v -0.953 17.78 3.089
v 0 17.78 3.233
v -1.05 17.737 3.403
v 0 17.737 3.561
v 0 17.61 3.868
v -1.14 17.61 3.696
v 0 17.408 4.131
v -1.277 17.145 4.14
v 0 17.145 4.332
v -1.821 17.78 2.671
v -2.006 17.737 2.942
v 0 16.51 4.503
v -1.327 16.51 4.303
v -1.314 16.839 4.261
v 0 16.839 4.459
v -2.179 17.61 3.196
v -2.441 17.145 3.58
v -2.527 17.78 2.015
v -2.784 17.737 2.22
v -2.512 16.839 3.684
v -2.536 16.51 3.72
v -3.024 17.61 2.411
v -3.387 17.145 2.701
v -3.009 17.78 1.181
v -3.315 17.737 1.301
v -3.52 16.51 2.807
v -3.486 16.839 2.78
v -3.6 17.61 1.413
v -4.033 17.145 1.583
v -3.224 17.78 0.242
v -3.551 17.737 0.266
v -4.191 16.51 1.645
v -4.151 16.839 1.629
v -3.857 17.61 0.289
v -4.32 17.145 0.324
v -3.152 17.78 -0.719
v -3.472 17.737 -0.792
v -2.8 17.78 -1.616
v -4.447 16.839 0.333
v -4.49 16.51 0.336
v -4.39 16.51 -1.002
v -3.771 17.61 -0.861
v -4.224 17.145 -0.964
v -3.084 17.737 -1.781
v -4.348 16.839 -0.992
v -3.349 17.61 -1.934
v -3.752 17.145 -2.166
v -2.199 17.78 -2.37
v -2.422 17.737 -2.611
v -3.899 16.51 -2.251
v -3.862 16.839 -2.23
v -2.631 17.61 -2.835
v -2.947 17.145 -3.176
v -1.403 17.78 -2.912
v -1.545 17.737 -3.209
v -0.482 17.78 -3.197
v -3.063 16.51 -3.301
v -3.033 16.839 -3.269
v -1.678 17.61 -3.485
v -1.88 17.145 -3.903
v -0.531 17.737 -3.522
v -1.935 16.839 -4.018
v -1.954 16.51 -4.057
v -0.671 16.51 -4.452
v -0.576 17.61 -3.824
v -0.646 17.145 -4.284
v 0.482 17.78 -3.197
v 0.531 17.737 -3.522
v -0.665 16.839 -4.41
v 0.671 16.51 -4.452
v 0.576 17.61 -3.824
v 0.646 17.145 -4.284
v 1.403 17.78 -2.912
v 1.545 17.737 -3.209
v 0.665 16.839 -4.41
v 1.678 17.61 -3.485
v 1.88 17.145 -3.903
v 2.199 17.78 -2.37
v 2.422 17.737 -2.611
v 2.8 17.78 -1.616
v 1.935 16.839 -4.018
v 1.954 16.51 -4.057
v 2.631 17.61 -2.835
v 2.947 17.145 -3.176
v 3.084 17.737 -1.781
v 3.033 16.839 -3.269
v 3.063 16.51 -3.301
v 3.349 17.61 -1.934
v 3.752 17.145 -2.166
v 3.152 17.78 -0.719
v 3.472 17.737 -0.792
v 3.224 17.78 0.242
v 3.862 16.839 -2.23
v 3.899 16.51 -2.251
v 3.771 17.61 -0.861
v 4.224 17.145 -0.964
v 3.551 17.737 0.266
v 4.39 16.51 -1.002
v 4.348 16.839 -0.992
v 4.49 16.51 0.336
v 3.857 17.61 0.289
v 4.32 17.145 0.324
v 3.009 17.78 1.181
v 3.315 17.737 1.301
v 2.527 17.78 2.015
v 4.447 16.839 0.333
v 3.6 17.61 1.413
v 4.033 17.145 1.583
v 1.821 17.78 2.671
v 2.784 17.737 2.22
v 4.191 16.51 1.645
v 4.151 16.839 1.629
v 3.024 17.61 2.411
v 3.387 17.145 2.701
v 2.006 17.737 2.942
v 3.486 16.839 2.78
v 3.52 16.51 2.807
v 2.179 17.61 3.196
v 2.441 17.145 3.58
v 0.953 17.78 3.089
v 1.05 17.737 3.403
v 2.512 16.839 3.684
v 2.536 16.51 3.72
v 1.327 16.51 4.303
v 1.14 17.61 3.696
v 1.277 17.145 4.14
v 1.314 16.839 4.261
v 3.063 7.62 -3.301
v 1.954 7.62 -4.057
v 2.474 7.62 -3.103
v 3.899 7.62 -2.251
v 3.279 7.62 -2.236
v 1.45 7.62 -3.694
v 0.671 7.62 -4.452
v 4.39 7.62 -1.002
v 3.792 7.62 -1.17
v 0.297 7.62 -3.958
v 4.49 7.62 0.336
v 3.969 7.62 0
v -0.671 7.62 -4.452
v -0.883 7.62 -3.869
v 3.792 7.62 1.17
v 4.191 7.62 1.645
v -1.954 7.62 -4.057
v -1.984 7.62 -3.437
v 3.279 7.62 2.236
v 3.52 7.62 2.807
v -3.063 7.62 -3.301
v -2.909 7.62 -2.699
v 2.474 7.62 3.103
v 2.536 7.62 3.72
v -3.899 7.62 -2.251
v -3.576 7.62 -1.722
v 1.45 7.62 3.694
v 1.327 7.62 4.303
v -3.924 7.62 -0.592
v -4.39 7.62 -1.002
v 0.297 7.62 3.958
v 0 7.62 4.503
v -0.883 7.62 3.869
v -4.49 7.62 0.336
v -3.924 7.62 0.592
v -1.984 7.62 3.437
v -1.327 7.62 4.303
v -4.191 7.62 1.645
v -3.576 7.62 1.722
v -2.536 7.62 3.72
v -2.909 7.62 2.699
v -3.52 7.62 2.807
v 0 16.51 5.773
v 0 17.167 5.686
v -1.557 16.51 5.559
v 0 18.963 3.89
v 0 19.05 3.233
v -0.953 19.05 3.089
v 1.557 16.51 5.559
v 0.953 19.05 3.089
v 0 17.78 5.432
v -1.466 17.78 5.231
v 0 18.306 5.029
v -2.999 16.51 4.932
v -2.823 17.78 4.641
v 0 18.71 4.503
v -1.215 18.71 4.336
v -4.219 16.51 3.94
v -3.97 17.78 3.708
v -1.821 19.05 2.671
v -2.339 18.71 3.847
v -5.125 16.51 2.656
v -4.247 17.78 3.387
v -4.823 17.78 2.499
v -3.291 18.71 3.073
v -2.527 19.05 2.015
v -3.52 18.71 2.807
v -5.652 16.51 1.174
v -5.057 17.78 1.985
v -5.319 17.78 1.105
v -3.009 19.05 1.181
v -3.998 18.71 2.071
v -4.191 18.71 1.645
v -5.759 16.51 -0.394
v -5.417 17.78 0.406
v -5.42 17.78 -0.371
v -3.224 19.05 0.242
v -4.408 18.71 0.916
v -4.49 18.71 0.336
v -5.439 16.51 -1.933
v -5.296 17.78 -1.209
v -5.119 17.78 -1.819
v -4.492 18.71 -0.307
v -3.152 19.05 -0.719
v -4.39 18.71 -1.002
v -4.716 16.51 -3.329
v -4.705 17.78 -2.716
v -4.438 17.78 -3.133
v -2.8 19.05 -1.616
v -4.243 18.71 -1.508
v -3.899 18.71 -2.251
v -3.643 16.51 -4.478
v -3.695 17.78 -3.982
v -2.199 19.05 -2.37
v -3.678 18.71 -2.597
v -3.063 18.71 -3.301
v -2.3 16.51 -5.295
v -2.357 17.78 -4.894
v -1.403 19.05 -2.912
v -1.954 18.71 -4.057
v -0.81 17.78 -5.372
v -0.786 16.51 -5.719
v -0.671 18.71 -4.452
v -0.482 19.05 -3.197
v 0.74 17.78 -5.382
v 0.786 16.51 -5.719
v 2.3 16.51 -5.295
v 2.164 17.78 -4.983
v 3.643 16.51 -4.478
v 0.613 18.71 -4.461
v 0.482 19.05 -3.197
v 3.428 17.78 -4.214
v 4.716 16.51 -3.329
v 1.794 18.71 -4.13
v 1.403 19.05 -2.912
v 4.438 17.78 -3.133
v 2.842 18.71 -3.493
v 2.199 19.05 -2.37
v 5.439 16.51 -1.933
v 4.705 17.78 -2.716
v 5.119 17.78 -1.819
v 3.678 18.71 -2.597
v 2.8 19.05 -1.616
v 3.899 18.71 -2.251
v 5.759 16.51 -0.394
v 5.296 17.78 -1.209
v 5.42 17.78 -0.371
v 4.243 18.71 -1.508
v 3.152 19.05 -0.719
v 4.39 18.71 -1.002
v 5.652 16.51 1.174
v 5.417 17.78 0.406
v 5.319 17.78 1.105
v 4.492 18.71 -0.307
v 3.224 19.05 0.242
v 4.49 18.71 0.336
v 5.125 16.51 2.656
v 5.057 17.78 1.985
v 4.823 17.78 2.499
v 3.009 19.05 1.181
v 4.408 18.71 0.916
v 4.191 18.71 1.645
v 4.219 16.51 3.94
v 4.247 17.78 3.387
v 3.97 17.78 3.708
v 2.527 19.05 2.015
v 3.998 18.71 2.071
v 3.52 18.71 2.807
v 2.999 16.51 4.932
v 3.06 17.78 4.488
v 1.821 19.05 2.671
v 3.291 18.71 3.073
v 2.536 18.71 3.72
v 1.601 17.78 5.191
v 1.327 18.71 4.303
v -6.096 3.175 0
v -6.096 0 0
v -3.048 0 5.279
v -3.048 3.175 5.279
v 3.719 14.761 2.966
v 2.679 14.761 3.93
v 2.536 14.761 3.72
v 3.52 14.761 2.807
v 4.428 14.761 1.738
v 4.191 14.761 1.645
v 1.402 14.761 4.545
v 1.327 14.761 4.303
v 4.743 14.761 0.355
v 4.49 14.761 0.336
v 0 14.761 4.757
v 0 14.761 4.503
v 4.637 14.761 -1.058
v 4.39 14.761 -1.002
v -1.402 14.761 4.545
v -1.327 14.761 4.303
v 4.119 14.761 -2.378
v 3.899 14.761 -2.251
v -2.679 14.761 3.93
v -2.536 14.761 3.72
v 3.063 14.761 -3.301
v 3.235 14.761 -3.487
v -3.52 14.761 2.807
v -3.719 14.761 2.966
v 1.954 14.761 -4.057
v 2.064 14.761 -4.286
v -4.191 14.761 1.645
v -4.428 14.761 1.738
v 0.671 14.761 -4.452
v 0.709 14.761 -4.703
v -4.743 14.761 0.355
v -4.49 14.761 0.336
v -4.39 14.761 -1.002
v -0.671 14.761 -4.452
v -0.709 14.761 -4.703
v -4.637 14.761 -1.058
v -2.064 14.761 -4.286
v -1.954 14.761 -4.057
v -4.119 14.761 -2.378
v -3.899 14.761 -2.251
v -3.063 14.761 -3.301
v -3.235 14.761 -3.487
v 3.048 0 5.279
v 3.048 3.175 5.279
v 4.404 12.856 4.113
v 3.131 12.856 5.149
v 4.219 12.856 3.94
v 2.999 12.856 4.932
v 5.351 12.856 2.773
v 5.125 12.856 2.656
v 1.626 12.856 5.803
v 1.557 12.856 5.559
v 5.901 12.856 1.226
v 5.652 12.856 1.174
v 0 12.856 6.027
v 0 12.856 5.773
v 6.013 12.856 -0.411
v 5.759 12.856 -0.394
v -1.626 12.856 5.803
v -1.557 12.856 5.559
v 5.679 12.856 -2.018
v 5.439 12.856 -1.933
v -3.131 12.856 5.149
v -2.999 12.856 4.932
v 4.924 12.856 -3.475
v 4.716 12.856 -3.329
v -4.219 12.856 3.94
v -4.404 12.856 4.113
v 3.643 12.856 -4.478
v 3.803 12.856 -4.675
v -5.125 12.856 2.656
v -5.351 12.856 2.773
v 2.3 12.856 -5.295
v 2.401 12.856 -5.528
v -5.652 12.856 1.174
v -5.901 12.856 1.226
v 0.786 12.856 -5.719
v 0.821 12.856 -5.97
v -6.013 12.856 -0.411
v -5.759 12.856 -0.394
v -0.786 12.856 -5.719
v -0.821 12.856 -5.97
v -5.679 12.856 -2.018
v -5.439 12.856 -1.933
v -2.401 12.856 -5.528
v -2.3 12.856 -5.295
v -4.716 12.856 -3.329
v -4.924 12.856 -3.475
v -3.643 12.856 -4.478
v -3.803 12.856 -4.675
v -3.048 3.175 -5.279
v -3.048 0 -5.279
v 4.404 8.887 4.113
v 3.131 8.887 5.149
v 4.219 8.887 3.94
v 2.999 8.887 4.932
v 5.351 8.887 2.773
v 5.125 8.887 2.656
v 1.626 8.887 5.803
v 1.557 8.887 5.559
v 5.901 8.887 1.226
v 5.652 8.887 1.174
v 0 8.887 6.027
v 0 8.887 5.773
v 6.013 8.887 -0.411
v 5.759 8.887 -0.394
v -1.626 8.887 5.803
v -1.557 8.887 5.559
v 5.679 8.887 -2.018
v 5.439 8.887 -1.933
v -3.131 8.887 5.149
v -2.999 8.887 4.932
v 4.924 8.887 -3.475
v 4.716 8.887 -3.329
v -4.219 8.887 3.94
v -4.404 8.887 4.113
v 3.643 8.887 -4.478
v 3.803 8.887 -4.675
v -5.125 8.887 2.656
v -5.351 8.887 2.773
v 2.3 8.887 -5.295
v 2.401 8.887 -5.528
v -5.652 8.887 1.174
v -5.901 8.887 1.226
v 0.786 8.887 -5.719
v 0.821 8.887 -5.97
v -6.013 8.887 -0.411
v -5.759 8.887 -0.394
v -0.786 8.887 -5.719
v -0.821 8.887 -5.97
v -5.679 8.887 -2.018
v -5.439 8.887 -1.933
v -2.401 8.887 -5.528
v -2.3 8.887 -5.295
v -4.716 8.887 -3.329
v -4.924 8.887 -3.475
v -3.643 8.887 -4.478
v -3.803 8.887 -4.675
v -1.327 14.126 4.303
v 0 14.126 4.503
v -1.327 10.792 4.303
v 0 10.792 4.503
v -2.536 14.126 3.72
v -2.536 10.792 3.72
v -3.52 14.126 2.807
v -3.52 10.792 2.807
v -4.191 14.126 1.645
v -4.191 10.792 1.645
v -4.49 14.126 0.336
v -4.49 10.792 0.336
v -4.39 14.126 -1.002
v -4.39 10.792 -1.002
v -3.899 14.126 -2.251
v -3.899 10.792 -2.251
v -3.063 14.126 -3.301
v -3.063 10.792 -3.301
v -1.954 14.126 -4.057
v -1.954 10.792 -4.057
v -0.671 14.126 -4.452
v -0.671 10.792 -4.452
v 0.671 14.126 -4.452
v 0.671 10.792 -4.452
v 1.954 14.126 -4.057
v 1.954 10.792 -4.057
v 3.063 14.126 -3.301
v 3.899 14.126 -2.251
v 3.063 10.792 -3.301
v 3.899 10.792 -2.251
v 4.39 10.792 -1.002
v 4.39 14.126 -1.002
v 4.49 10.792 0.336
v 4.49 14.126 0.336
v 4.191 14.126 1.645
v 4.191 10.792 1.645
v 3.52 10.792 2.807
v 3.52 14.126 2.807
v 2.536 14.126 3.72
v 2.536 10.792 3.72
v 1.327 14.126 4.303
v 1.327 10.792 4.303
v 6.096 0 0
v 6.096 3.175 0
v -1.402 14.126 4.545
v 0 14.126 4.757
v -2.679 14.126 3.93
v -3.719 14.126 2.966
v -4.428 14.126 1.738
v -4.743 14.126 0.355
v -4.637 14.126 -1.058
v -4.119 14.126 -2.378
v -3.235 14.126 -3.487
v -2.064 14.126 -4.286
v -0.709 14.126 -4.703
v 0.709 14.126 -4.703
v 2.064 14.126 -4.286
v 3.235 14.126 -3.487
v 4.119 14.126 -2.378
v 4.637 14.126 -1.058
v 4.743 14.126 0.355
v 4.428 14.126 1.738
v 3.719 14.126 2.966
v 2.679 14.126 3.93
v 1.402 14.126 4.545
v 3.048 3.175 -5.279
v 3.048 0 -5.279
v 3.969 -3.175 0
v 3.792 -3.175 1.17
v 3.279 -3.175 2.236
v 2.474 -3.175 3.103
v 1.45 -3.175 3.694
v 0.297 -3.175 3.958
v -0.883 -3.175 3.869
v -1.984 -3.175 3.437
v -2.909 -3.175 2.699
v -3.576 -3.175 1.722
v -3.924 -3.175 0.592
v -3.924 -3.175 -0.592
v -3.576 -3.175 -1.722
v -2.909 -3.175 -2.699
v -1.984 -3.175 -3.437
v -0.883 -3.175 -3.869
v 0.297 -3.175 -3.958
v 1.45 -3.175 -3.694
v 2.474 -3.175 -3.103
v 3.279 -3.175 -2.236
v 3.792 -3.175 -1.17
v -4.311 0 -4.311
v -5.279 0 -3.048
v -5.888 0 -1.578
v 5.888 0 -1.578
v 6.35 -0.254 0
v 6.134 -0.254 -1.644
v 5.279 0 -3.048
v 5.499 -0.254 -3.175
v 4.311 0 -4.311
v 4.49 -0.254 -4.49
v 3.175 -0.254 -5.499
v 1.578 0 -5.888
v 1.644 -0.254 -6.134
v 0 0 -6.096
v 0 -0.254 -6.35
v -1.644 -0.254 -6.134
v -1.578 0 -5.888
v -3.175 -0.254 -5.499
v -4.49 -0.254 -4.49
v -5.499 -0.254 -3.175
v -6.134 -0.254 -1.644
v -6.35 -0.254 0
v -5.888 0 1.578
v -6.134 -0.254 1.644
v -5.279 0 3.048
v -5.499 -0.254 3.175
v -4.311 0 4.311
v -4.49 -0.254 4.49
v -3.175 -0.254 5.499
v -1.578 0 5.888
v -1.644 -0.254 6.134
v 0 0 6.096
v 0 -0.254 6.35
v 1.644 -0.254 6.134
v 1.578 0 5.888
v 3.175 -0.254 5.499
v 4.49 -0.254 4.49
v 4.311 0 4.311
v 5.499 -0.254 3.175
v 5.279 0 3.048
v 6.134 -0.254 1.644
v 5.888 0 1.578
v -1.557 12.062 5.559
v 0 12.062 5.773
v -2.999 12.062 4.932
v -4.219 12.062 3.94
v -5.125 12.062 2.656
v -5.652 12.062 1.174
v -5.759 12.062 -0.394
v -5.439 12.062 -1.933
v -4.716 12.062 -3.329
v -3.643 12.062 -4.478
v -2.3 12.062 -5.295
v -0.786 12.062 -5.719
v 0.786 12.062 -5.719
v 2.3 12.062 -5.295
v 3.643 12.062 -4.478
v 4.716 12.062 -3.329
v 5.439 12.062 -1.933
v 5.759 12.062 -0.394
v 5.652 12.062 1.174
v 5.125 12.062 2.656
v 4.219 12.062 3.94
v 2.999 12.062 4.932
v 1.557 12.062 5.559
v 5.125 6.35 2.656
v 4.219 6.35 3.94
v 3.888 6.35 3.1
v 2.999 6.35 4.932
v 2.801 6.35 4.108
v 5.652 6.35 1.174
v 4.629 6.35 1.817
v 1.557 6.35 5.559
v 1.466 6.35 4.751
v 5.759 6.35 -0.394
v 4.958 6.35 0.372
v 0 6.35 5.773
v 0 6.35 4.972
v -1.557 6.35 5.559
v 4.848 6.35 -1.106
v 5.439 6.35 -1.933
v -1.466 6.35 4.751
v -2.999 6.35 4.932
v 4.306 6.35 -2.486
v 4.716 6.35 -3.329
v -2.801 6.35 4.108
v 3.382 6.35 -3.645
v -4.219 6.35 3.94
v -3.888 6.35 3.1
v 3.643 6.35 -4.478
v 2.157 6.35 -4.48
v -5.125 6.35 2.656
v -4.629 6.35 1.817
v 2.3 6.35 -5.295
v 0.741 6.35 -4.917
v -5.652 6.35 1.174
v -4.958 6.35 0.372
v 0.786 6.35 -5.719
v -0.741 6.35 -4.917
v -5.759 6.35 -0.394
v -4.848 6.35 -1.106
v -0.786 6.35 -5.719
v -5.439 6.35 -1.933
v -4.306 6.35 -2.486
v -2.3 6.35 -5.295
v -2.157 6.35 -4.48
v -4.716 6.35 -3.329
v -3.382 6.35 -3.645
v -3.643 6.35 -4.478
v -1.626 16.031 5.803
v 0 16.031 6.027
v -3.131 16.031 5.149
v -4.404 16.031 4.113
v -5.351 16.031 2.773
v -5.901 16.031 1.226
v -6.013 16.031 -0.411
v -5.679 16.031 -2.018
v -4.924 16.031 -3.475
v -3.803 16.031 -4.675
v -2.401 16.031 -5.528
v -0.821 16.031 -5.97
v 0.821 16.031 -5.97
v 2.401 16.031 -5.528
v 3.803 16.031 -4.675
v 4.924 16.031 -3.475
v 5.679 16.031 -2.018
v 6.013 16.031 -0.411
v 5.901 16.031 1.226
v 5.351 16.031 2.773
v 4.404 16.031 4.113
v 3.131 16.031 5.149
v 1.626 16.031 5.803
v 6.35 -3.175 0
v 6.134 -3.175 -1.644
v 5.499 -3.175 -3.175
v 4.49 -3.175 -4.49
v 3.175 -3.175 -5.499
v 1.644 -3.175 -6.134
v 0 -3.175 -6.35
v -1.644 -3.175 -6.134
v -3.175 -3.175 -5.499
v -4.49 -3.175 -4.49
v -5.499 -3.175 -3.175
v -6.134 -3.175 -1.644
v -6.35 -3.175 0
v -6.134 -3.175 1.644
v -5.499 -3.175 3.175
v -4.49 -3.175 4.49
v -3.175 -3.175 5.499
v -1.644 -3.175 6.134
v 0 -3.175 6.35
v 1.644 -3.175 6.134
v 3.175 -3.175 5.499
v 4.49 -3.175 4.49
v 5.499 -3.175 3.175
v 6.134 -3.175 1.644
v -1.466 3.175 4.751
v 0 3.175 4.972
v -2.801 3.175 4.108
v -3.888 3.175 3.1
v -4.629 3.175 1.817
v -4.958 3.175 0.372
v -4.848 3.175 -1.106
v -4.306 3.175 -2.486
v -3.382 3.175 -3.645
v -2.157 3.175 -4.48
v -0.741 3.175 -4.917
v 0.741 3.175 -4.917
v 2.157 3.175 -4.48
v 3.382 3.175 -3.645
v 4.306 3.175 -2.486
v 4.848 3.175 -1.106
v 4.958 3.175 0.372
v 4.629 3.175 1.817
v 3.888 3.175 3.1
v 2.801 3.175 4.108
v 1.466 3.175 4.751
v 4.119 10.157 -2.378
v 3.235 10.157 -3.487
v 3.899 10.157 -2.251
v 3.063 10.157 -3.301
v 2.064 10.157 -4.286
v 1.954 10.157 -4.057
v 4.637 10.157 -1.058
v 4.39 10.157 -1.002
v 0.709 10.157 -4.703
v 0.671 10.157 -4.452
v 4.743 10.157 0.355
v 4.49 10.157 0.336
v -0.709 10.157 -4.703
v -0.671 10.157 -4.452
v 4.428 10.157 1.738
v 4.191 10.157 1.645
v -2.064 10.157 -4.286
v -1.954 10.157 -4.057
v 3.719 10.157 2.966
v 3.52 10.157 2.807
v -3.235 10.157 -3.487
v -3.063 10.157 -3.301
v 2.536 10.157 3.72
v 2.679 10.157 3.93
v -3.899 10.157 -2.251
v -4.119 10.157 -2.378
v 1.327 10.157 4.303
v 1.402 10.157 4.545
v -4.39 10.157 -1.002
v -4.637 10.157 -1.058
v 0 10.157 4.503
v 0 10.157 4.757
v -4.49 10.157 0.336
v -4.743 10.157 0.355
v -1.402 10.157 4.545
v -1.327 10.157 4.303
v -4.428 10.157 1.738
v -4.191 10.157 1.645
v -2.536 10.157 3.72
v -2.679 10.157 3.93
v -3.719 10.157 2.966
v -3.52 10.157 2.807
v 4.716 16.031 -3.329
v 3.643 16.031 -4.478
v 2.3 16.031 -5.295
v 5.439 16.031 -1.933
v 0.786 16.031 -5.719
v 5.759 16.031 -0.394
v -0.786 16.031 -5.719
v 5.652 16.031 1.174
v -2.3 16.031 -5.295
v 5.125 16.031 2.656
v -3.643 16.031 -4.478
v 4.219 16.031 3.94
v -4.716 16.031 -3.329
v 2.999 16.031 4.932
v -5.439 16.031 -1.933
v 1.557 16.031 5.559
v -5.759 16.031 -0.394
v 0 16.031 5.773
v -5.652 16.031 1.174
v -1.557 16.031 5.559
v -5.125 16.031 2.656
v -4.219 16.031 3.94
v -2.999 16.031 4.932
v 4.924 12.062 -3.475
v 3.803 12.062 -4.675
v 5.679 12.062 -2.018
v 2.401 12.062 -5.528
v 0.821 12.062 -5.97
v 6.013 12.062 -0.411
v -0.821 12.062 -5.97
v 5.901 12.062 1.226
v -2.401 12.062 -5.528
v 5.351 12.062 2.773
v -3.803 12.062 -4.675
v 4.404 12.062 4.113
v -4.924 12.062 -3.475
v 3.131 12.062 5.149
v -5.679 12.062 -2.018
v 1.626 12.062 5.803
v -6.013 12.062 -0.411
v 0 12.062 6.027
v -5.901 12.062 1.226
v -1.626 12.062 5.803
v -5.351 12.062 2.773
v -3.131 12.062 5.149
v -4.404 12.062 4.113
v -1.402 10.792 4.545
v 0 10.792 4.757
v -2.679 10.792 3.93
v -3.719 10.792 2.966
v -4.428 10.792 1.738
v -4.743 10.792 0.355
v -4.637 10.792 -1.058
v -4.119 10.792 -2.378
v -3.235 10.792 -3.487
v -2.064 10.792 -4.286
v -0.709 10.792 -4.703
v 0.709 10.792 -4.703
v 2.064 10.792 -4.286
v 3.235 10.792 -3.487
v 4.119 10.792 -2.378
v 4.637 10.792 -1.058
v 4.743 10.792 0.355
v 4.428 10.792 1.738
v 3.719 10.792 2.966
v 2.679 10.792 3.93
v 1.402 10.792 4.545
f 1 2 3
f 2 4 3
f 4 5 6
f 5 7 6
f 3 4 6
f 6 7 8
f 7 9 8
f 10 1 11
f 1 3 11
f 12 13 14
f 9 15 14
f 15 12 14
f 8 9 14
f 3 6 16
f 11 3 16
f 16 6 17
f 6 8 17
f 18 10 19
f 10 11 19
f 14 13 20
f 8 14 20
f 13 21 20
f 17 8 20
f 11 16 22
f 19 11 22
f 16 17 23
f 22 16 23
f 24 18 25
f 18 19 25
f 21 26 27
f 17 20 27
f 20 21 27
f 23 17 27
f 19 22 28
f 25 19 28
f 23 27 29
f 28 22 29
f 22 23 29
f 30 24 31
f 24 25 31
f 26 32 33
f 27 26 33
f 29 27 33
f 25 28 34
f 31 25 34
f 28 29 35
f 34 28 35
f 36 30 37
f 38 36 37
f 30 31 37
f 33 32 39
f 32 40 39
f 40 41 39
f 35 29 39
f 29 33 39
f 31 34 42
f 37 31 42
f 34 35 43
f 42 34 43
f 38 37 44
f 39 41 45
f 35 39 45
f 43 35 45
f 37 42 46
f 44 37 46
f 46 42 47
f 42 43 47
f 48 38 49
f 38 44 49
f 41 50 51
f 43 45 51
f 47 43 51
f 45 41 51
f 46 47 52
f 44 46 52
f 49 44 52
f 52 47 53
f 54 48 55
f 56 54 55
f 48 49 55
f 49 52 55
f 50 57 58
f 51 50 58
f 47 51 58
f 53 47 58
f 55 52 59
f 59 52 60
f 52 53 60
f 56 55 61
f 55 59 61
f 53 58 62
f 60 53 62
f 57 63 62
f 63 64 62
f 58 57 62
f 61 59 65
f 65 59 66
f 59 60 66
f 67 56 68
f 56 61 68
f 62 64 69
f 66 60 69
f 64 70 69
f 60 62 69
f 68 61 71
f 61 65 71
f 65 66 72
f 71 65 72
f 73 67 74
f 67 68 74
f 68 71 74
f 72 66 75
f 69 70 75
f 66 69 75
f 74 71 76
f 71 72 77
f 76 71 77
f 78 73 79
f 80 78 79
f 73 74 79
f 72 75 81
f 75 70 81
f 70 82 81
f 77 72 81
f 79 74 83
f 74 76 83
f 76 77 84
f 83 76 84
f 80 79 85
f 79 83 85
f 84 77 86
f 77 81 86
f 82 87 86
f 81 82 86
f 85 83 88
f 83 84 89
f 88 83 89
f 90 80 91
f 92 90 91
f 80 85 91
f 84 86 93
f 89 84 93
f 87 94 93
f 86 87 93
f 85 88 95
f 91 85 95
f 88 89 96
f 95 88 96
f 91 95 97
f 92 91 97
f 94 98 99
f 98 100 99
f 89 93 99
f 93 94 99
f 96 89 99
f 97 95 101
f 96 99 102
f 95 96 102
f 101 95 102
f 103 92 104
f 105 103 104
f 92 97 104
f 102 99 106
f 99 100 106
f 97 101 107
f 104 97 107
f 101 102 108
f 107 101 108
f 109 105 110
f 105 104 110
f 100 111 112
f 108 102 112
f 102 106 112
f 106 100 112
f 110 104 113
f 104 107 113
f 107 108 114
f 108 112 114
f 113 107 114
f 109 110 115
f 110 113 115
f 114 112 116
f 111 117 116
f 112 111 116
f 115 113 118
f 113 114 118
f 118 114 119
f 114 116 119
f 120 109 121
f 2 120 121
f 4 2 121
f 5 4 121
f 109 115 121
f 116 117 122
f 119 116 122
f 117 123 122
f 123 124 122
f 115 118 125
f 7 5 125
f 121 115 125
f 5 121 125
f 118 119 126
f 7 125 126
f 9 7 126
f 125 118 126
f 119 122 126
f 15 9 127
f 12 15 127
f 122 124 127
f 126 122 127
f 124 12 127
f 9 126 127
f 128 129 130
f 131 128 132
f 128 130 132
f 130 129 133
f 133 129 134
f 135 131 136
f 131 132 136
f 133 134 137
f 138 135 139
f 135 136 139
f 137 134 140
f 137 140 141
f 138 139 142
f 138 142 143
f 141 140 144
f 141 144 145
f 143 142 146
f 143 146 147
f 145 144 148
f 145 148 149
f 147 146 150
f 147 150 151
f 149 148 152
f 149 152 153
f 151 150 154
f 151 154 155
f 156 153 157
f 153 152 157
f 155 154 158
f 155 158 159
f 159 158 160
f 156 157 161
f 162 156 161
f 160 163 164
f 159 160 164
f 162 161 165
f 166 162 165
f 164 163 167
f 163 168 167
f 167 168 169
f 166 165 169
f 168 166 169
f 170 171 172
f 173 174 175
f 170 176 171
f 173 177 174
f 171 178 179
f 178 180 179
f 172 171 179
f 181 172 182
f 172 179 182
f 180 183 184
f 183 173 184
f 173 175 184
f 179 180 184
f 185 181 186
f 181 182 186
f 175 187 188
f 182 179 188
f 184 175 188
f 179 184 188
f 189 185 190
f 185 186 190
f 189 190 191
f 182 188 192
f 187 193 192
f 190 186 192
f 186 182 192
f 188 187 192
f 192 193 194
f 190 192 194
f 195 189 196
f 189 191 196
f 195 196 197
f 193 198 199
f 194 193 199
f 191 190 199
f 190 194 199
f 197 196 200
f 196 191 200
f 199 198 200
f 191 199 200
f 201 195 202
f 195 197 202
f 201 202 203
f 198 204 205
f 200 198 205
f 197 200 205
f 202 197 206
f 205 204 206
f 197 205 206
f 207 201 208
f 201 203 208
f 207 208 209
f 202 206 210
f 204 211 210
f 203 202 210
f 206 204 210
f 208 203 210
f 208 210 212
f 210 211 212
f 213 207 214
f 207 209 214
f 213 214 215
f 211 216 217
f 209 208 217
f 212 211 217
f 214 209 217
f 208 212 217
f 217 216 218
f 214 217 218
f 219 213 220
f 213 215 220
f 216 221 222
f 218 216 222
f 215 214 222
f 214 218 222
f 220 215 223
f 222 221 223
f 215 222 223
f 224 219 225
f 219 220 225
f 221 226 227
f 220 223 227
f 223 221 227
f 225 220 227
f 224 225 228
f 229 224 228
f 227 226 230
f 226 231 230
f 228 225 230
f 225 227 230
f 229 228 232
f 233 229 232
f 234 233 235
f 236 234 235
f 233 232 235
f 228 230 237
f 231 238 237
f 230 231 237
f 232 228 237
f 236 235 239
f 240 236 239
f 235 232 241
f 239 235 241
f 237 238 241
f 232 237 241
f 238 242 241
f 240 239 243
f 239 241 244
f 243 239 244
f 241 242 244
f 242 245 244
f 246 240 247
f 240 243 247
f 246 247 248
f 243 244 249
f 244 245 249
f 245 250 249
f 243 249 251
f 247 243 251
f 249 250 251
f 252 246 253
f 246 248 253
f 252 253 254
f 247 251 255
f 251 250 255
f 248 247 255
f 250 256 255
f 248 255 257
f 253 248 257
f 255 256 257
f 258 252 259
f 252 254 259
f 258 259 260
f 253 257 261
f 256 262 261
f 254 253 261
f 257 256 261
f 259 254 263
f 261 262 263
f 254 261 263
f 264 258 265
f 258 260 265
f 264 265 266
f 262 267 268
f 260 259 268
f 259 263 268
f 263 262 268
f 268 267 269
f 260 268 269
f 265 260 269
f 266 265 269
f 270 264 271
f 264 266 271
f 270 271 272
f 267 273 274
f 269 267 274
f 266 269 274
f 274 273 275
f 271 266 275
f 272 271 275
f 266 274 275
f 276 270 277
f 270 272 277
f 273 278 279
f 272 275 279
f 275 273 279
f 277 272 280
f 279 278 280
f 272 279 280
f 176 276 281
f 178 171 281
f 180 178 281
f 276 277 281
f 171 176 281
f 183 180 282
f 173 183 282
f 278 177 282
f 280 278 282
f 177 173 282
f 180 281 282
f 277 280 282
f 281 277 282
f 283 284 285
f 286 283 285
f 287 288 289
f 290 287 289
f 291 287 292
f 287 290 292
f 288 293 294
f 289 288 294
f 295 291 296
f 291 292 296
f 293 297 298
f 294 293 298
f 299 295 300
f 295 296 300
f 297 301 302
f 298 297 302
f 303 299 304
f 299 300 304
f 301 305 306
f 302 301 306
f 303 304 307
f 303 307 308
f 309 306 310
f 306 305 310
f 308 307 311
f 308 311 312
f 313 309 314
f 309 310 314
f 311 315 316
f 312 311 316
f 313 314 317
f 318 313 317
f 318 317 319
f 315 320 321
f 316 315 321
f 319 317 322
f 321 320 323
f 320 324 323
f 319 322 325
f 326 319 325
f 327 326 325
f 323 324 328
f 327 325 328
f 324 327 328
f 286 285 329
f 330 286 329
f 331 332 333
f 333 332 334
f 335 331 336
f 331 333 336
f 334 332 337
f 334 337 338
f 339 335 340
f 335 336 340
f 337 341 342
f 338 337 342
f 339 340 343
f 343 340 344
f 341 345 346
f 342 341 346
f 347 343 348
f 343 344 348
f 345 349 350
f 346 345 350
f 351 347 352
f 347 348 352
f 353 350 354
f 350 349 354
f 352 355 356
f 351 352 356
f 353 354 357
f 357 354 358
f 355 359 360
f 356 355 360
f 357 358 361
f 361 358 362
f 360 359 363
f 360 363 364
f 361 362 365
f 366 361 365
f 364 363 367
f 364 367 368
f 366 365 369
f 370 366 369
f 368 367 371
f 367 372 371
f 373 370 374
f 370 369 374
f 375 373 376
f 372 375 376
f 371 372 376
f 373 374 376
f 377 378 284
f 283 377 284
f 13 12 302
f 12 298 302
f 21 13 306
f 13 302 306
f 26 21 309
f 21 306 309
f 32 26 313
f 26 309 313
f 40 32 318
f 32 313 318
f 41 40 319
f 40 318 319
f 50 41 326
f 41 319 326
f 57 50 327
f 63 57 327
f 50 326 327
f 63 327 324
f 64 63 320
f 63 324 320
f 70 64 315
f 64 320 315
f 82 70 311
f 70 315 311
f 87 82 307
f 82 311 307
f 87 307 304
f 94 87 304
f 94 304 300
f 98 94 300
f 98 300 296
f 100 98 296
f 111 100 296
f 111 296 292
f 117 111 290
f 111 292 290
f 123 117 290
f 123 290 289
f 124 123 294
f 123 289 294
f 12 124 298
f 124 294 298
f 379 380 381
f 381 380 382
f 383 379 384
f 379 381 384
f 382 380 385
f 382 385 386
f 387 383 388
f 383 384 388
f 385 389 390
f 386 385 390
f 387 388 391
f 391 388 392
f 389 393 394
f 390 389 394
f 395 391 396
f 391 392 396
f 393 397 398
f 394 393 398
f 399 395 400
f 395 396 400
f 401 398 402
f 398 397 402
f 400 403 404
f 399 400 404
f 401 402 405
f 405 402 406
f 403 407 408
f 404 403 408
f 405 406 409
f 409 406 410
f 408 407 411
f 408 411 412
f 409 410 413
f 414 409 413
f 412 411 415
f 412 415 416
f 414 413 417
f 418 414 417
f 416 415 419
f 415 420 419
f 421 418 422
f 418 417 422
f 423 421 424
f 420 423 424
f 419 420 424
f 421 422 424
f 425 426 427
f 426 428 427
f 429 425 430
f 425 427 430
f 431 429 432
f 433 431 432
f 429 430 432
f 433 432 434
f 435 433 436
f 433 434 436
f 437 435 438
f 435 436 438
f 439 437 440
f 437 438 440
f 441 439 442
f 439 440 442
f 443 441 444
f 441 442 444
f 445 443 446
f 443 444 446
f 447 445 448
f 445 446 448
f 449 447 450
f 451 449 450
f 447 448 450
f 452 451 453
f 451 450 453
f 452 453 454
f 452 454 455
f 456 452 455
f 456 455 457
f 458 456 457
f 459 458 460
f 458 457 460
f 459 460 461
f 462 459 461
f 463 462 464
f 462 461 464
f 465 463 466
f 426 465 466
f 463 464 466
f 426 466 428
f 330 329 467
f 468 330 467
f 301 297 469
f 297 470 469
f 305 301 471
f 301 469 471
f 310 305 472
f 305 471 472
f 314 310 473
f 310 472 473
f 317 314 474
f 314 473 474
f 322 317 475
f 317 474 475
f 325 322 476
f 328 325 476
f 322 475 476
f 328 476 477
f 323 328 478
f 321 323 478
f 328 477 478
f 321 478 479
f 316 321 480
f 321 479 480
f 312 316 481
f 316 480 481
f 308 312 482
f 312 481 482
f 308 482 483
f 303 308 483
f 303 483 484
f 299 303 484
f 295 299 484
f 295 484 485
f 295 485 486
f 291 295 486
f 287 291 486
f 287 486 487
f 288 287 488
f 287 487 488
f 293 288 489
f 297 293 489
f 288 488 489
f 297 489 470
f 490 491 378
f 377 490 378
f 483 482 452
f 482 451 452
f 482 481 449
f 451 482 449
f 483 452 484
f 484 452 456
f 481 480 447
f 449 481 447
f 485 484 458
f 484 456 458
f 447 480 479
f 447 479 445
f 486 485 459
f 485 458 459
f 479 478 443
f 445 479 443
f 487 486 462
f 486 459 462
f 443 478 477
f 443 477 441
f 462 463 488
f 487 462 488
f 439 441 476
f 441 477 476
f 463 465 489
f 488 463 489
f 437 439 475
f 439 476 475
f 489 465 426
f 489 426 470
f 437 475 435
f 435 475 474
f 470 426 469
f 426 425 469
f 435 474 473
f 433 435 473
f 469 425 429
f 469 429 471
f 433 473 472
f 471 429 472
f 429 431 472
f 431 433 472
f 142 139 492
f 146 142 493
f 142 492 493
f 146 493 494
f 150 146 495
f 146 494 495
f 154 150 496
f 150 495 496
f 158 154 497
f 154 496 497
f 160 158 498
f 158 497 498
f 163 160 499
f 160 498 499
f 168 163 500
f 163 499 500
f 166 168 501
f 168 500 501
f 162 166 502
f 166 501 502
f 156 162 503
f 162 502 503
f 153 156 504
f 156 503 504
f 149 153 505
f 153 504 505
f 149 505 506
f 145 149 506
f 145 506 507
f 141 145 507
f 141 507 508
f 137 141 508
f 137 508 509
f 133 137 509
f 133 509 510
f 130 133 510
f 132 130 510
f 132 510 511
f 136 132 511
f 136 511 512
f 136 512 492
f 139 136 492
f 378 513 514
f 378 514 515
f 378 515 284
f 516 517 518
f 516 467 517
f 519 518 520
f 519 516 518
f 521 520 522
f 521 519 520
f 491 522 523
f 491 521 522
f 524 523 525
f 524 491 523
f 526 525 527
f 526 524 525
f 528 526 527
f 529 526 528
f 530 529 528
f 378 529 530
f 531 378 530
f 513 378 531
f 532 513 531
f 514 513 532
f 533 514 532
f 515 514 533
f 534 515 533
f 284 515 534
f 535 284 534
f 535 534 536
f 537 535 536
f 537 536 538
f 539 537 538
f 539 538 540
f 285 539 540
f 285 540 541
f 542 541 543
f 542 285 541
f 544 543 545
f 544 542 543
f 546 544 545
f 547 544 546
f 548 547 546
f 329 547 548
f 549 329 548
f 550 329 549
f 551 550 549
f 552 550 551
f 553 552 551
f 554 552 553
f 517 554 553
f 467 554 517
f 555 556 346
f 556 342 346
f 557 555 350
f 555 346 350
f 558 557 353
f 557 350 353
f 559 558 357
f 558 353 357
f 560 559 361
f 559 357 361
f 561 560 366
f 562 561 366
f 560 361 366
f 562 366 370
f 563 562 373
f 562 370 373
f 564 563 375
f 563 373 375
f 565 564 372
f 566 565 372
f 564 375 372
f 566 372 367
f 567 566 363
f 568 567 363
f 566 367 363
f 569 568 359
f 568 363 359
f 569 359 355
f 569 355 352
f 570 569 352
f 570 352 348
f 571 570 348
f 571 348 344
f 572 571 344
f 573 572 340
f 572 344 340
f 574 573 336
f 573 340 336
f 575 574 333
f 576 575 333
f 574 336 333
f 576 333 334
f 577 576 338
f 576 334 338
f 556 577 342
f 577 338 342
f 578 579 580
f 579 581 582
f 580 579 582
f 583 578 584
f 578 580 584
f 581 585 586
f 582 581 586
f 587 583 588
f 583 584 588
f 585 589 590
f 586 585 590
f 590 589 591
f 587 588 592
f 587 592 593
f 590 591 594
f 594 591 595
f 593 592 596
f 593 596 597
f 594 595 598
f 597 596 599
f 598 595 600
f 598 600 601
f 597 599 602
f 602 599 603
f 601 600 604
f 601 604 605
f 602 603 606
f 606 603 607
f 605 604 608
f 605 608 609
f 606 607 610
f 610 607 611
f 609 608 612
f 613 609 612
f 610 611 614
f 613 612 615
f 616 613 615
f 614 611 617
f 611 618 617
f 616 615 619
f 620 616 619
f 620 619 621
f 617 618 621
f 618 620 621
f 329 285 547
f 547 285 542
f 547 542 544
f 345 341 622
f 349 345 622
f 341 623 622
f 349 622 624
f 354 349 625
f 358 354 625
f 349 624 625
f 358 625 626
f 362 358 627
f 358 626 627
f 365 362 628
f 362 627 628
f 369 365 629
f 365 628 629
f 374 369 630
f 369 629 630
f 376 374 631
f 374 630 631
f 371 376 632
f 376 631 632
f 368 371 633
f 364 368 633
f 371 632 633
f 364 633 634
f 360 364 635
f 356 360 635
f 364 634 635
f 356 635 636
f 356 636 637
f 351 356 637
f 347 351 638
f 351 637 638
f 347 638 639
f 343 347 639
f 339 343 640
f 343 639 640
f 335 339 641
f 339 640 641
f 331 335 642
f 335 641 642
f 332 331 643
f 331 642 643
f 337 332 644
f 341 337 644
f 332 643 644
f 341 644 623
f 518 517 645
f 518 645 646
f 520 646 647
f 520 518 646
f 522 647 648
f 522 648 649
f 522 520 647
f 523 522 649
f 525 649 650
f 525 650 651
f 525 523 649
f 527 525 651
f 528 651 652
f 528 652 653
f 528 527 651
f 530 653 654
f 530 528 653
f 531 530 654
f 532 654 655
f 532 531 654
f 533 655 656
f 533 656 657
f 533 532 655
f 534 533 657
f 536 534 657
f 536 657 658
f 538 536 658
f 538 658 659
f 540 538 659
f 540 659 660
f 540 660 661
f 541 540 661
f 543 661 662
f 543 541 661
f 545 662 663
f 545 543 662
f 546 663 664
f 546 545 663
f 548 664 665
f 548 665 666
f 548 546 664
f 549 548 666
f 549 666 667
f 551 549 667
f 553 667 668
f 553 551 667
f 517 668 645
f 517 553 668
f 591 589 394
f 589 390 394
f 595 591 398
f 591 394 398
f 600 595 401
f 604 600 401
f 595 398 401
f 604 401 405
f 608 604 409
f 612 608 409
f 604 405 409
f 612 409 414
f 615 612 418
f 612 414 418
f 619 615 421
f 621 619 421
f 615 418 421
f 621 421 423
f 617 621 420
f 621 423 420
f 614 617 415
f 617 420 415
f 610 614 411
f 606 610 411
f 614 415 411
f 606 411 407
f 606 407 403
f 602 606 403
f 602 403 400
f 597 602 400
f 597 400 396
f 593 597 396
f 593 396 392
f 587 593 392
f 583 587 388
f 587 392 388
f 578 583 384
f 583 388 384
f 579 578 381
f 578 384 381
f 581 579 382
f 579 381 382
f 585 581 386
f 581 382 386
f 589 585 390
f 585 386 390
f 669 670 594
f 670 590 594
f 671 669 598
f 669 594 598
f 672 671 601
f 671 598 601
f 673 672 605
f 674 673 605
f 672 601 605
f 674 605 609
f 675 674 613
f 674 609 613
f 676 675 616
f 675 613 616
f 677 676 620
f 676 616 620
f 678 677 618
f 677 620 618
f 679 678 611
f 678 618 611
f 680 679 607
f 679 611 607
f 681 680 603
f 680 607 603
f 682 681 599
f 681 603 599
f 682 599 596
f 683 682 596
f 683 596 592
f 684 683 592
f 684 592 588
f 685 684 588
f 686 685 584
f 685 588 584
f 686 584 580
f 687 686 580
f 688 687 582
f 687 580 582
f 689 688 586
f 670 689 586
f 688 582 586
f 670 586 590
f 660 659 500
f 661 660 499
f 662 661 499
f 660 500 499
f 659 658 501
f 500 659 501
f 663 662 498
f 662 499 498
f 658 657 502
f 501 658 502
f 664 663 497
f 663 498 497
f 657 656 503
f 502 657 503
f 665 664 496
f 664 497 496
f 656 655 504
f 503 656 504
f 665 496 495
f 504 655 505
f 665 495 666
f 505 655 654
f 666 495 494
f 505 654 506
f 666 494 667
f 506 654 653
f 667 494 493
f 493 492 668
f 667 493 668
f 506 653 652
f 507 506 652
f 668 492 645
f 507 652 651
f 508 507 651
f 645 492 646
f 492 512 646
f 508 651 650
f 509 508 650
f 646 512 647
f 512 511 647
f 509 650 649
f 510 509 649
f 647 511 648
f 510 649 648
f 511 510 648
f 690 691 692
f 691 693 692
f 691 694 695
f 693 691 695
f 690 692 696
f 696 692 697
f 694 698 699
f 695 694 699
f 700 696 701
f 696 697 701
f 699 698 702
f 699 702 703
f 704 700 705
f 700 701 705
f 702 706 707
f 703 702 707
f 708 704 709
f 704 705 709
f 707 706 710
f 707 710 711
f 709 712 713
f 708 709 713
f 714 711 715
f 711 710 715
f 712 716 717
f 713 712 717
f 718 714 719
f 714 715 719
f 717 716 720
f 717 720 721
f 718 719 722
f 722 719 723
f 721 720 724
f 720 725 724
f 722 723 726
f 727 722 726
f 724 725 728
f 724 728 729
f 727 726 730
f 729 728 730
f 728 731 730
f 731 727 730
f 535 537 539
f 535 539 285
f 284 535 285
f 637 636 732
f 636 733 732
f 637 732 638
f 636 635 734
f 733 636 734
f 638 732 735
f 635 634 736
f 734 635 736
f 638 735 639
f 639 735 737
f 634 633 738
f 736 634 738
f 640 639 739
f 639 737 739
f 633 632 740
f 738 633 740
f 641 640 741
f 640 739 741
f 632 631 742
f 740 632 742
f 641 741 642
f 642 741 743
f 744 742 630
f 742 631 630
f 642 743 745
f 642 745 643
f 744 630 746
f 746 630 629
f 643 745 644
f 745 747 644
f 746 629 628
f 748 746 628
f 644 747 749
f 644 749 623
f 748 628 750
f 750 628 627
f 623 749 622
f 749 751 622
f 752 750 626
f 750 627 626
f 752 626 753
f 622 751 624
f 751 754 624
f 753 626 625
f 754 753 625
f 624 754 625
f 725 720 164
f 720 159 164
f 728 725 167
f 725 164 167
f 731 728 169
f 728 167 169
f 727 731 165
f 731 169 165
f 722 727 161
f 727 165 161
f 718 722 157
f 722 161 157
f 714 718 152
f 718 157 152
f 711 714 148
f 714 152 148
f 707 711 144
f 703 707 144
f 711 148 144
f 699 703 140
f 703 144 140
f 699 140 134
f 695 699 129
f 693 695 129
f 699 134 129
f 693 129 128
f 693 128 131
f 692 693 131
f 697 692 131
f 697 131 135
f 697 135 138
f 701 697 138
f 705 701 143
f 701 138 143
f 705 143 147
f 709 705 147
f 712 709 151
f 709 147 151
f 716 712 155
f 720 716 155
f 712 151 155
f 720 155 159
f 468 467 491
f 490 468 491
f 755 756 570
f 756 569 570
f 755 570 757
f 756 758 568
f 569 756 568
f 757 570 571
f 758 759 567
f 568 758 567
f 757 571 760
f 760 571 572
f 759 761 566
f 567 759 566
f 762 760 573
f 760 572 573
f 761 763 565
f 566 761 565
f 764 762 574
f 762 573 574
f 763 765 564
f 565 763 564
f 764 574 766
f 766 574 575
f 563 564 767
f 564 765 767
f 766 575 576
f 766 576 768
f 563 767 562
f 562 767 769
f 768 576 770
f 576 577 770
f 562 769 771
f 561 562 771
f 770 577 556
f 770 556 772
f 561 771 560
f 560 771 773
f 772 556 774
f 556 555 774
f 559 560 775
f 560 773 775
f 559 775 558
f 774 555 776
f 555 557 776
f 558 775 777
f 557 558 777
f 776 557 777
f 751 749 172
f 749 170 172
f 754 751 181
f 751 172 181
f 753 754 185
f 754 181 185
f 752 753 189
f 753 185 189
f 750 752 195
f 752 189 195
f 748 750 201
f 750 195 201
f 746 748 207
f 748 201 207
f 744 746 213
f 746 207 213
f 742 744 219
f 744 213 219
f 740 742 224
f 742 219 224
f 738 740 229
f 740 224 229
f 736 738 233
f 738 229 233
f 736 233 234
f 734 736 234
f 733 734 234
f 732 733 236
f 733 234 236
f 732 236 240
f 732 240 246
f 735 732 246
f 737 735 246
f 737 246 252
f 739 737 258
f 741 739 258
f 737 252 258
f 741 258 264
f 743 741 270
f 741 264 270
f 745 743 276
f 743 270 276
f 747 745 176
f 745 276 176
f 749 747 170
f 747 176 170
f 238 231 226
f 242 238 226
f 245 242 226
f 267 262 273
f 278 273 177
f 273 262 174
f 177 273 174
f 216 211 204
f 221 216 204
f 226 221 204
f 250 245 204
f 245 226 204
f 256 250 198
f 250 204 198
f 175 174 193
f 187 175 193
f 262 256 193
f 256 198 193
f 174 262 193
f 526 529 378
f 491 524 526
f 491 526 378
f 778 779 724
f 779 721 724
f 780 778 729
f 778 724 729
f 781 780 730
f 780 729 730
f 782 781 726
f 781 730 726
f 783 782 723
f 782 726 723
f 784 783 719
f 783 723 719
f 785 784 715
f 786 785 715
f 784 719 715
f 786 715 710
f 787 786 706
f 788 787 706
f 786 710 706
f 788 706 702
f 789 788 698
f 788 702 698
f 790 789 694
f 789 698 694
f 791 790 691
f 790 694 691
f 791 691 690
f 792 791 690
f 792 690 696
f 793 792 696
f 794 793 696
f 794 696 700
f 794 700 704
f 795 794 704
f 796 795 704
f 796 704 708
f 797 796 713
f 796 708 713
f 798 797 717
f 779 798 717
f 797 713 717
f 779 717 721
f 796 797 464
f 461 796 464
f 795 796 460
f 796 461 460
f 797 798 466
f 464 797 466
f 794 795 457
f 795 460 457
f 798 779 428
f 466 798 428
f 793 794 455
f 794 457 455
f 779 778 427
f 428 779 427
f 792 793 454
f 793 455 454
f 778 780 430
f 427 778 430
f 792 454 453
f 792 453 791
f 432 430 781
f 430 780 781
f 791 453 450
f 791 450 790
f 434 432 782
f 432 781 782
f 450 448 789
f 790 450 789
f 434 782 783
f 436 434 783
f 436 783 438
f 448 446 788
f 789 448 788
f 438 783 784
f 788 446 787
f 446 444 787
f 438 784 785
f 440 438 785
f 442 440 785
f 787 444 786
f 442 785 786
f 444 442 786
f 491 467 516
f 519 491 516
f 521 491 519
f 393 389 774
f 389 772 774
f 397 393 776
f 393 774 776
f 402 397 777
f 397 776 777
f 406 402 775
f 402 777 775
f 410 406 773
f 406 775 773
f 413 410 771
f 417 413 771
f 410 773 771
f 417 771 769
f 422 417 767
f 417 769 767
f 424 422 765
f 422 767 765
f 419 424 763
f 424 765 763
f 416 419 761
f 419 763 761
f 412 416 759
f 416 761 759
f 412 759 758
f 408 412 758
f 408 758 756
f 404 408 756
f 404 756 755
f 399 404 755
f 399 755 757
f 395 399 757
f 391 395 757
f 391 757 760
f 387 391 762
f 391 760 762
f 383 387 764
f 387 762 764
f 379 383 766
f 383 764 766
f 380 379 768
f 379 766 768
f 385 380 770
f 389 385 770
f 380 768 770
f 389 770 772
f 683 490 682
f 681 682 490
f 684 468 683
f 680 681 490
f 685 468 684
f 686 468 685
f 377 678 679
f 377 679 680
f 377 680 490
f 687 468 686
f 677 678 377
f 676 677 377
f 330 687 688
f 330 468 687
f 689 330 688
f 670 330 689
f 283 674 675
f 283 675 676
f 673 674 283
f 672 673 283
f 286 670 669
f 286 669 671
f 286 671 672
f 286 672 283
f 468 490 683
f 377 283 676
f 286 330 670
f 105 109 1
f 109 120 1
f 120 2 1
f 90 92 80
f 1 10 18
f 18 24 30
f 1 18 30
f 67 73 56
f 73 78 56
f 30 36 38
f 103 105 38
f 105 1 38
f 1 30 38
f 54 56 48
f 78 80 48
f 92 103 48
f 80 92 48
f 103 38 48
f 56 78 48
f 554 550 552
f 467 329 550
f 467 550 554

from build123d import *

# Parameters (mm, degrees)
SKETCH1_R      = 6.35
EXTRUDE1_DEPTH = 3.175
CHAMFER1_SIZE  = 0.254
EXTRUDE2_DEPTH = 3.175
SKETCH5_R      = 3.96875
EXTRUDE4_DEPTH = 12.7


with BuildPart() as part:
    # Sketch1 → Extrude1 (new body)
    with BuildSketch(Plane(origin=(0, 0, 0), x_dir=(1, 0, 0), z_dir=(0, 1, 0))):
        Circle(SKETCH1_R)
    extrude(amount=-EXTRUDE1_DEPTH)

    # Chamfer1
    chamfer1_edges = [part.edges().sort_by_distance(p)[0] for p in [
        (-6.35, 0, 0),
    ]]
    chamfer(chamfer1_edges, length=CHAMFER1_SIZE)

    # Sketch2 → Extrude2 (add)
    with BuildSketch(Plane(origin=(0, 0, 0), x_dir=(-1, 0, 0), z_dir=(0, 1, 0))):
        Polygon((-6.096, 0), (-3.048, -5.279290861), (3.048, -5.279290861), (6.096, 0), (3.048, 5.279290861), (-3.048, 5.279290861), align=None)
    extrude(amount=EXTRUDE2_DEPTH)

    # Sketch4 → Revolve1 (revolve)
    with BuildSketch(Plane(origin=(0, 0, 0), x_dir=(0, 0, -1), z_dir=(1, 0, 0))):
        with BuildLine():
            Line((-4.97229944, 3.175), (-4.97229944, 6.35))
            Line((-4.97229944, 6.35), (-5.772606153, 6.35))
            Line((-5.772606153, 6.35), (-5.772606153, 8.887450179))
            Line((-5.772606153, 8.887450179), (-6.026606153, 8.887450179))
            Line((-6.026606153, 8.887450179), (-6.026606153, 12.062450179))
            Line((-6.026606153, 12.062450179), (-5.772606153, 12.062450179))
            Line((-5.772606153, 12.062450179), (-5.772606153, 12.856200179))
            Line((-5.772606153, 12.856200179), (-6.026606153, 12.856200179))
            Line((-6.026606153, 12.856200179), (-6.026606153, 16.031200179))
            Line((-6.026606153, 16.031200179), (-5.772606153, 16.031200179))
            Line((-5.772606153, 16.031200179), (-5.772606153, 16.51))
            ThreePointArc((-5.772606153, 16.51), (-5.028657378, 18.306051224), (-3.232606153, 19.05))
            Line((-3.232606153, 19.05), (0, 19.05))
            Line((0, 19.05), (0, 17.78))
            Line((0, 17.78), (-3.232606153, 17.78))
            ThreePointArc((-3.232606153, 17.78), (-4.130631766, 17.408025612), (-4.502606153, 16.51))
            Line((-4.502606153, 16.51), (-4.502606153, 14.761200179))
            Line((-4.502606153, 14.761200179), (-4.756606153, 14.761200179))
            Line((-4.756606153, 14.761200179), (-4.756606153, 14.126200179))
            Line((-4.756606153, 14.126200179), (-4.502606153, 14.126200179))
            Line((-4.502606153, 14.126200179), (-4.502606153, 10.792450179))
            Line((-4.502606153, 10.792450179), (-4.756606153, 10.792450179))
            Line((-4.756606153, 10.792450179), (-4.756606153, 10.157450179))
            Line((-4.756606153, 10.157450179), (-4.502606153, 10.157450179))
            Line((-4.502606153, 10.157450179), (-4.502606153, 7.62))
            Line((-4.502606153, 7.62), (-3.70229944, 7.62))
            Line((-3.70229944, 7.62), (-3.70229944, 4.445))
            Line((-3.70229944, 4.445), (0, 4.445))
            Line((0, 4.445), (0, 3.175))
            Line((0, 3.175), (-4.97229944, 3.175))
        make_face()
    revolve(axis=Axis((0, 20.169611013, 0), (0, -1, 0)))

    # Sketch5 → Extrude4 (cut)
    with BuildSketch(Plane.XZ.offset(3.175)):
        Circle(SKETCH5_R)
    extrude(amount=-EXTRUDE4_DEPTH, mode=Mode.SUBTRACT)


solid = part.part
